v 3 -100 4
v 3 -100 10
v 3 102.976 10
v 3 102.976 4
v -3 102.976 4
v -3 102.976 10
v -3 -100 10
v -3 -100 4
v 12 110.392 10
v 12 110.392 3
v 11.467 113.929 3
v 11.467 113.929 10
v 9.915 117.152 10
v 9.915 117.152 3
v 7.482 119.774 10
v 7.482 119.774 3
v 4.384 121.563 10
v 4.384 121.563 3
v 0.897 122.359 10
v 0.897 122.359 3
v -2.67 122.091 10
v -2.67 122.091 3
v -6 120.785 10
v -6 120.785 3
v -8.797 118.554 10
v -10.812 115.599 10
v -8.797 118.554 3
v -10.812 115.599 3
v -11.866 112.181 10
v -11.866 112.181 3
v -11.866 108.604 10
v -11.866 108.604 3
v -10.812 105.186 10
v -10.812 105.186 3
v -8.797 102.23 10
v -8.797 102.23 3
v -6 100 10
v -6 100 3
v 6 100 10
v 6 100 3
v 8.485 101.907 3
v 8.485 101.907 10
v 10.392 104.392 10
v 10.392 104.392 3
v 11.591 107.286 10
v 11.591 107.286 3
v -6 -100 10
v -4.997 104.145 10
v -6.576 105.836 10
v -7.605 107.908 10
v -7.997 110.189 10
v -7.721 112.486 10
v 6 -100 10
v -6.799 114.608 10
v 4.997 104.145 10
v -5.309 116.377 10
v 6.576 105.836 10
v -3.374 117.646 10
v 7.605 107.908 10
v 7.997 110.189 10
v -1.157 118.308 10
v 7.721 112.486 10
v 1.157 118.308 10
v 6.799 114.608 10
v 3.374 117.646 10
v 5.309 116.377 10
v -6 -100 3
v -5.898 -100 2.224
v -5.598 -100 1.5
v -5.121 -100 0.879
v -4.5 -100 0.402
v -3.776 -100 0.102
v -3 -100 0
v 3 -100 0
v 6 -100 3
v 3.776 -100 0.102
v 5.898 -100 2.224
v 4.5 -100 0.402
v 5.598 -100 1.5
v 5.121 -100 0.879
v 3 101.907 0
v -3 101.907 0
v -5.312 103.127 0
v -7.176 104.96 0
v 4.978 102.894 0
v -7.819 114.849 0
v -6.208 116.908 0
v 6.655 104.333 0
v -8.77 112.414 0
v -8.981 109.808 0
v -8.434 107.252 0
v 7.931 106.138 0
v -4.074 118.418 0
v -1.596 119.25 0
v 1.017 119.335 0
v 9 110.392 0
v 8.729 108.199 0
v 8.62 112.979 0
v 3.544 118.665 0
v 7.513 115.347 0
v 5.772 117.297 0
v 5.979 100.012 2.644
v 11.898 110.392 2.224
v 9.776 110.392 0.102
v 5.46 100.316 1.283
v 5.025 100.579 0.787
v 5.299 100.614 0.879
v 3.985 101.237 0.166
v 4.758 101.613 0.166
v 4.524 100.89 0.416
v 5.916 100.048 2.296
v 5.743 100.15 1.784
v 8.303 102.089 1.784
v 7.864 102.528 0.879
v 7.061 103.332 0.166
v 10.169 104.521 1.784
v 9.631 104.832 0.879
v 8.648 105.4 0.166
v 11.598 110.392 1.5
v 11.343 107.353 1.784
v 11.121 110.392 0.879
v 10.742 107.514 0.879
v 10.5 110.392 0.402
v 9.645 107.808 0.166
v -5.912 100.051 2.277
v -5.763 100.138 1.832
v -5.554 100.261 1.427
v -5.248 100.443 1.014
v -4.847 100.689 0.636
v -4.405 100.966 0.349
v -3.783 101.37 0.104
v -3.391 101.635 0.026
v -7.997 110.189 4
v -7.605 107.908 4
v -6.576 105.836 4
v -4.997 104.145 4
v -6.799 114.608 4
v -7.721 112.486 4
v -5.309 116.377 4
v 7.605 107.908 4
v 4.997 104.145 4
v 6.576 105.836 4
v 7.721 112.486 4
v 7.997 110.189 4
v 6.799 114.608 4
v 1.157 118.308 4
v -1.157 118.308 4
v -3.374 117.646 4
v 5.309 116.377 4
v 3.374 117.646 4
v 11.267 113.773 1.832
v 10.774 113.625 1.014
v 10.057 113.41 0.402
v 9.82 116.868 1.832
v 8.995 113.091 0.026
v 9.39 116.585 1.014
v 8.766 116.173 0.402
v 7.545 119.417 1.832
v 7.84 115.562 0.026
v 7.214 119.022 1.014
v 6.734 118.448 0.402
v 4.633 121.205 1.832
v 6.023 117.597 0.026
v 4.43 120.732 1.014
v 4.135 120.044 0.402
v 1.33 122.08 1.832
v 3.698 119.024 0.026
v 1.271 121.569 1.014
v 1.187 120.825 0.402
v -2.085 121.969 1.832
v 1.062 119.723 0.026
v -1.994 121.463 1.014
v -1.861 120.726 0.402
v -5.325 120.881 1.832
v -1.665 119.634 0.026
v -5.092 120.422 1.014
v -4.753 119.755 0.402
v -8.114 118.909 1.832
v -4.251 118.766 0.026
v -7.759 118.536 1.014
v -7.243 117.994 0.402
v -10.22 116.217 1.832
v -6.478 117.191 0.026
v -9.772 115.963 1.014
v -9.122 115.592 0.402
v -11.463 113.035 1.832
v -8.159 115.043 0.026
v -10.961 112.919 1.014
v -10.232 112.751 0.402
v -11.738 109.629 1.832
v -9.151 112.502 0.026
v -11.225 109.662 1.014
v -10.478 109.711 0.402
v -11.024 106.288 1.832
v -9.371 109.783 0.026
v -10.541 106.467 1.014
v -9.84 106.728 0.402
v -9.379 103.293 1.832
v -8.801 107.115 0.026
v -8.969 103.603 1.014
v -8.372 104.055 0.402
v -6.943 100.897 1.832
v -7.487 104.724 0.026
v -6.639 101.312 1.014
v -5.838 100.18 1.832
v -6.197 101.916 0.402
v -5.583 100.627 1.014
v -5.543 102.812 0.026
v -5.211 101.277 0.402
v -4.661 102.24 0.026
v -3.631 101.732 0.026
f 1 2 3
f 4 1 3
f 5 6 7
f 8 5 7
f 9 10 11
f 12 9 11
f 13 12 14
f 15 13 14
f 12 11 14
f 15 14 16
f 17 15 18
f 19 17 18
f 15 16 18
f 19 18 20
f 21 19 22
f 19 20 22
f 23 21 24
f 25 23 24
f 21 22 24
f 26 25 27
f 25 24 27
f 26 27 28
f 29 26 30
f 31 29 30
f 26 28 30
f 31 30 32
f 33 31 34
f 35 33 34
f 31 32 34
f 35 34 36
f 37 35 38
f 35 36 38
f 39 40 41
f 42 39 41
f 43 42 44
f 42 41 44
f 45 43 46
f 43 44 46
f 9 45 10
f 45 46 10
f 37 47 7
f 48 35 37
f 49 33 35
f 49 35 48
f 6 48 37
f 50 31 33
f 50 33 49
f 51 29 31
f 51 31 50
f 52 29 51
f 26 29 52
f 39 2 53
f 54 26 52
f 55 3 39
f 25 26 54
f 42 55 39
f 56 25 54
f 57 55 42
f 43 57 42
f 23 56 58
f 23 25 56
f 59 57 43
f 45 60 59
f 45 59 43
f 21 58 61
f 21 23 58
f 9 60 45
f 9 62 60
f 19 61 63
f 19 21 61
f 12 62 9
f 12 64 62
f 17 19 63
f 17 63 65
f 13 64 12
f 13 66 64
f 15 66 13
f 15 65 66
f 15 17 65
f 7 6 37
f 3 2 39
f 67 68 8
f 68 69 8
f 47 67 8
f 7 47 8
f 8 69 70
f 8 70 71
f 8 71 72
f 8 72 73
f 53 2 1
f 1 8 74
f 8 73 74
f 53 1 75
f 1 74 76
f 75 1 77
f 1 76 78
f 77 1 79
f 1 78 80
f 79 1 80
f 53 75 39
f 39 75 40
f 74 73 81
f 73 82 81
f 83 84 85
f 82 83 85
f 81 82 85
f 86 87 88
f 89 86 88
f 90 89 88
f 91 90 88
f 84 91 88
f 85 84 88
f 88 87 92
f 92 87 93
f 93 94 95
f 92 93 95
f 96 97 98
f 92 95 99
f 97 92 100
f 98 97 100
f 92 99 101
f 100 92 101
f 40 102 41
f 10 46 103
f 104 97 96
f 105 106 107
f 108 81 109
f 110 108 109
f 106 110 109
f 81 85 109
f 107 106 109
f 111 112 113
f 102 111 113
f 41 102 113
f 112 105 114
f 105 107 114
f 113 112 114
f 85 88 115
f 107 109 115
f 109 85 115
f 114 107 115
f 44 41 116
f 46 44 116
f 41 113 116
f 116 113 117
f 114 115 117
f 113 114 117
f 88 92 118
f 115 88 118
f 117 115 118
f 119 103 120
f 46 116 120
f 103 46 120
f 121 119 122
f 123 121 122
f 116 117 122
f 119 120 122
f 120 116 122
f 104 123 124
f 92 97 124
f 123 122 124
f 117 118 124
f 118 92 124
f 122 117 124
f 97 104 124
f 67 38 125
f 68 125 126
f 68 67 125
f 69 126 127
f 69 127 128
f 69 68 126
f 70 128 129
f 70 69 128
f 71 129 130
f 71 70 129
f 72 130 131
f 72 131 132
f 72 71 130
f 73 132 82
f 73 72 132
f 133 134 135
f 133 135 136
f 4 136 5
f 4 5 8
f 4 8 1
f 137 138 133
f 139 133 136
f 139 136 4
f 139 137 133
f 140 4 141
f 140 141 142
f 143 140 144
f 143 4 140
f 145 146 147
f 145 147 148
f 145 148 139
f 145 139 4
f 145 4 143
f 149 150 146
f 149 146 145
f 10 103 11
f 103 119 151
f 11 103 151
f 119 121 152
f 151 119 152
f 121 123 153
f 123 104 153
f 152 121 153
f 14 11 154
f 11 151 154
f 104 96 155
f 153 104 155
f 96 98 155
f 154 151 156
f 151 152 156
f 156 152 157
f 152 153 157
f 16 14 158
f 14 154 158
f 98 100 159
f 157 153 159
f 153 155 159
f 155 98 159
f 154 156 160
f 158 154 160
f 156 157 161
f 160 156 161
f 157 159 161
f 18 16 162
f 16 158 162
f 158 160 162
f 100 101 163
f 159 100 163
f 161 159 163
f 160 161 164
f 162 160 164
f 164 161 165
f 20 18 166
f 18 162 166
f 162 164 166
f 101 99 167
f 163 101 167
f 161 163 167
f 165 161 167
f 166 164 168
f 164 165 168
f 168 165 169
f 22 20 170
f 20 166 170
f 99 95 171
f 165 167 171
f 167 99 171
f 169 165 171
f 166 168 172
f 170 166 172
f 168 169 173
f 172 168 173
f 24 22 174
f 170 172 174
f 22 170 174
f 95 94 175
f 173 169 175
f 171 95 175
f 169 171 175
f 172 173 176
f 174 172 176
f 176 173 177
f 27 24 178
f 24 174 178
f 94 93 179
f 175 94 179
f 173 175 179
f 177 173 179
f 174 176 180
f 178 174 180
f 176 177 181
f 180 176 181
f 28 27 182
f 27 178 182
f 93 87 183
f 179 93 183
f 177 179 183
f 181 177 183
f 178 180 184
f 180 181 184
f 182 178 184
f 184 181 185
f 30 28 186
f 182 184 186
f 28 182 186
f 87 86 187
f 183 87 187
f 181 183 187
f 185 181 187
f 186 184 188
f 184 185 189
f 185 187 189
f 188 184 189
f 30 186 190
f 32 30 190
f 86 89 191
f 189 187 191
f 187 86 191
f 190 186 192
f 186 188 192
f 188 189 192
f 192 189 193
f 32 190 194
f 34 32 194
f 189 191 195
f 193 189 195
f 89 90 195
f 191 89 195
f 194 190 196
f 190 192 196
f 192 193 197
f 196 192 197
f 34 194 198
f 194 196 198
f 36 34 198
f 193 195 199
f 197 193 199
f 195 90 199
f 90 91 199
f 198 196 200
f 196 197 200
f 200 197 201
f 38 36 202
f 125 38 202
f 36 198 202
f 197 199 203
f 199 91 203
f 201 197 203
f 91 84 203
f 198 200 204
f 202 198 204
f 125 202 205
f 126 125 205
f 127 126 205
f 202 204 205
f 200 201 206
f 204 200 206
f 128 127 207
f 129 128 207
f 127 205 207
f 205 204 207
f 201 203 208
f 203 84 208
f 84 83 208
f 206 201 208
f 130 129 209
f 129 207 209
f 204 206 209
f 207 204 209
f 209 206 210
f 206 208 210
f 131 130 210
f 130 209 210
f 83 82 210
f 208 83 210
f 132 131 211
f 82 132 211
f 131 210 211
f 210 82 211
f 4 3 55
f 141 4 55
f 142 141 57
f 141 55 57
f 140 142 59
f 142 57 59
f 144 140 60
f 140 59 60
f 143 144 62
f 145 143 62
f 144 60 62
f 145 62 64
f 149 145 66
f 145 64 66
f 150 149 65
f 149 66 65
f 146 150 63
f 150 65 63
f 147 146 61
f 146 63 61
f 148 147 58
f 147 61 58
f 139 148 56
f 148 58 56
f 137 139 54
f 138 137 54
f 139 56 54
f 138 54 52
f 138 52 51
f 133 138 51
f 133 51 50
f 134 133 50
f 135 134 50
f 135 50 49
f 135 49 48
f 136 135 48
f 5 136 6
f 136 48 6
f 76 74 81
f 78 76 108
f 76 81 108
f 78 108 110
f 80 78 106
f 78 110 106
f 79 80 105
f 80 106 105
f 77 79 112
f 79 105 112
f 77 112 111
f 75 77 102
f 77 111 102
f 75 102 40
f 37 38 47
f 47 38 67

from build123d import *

# Parameters (mm, degrees)
F1_DEPTH = 10
F3_DEPTH = 6
F4_R     = 3


with BuildPart() as f1:
    # F0 (on Top) → F1 (new body)
    with BuildSketch(Plane.XY):
        with BuildLine():
            ThreePointArc((12, 110.3923048454), (-6, 120.7846096908), (-6, 100))
            Line((-6, 100), (6, 100))
            ThreePointArc((6, 100), (10.3923048454, 104.3923048454), (12, 110.3923048454))
        make_face()
        with BuildLine():
            ThreePointArc((6, 100), (0, 98.3923048454), (-6, 100))
            Line((-6, 100), (-6, -100))
            Line((-6, -100), (6, -100))
            Line((6, -100), (6, 100))
        make_face()
        with BuildLine():
            Line((6, 100), (-6, 100))
            ThreePointArc((-6, 100), (0, 98.3923048454), (6, 100))
        make_face()
    extrude(amount=F1_DEPTH)

    # F2 (on face) → F3 (cut)
    with BuildSketch(Plane.XY.offset(10)):
        with BuildLine():
            Line((3, -100), (3, 102.9761063583))
            ThreePointArc((3, 102.9761063583), (0, 118.3923048454), (-3, 102.9761063583))
            Line((-3, 102.9761063583), (-3, -100))
            Line((-3, -100), (3, -100))
        make_face()
    extrude(amount=-F3_DEPTH, mode=Mode.SUBTRACT)

    # F4
    f4_edges = [f1.edges().sort_by_distance(p)[0] for p in [
        (6, 0, 0),
        (0, 122.392305, 0),
        (-6, 0, 0),
    ]]
    fillet(f4_edges, radius=F4_R)


solid = f1.part
